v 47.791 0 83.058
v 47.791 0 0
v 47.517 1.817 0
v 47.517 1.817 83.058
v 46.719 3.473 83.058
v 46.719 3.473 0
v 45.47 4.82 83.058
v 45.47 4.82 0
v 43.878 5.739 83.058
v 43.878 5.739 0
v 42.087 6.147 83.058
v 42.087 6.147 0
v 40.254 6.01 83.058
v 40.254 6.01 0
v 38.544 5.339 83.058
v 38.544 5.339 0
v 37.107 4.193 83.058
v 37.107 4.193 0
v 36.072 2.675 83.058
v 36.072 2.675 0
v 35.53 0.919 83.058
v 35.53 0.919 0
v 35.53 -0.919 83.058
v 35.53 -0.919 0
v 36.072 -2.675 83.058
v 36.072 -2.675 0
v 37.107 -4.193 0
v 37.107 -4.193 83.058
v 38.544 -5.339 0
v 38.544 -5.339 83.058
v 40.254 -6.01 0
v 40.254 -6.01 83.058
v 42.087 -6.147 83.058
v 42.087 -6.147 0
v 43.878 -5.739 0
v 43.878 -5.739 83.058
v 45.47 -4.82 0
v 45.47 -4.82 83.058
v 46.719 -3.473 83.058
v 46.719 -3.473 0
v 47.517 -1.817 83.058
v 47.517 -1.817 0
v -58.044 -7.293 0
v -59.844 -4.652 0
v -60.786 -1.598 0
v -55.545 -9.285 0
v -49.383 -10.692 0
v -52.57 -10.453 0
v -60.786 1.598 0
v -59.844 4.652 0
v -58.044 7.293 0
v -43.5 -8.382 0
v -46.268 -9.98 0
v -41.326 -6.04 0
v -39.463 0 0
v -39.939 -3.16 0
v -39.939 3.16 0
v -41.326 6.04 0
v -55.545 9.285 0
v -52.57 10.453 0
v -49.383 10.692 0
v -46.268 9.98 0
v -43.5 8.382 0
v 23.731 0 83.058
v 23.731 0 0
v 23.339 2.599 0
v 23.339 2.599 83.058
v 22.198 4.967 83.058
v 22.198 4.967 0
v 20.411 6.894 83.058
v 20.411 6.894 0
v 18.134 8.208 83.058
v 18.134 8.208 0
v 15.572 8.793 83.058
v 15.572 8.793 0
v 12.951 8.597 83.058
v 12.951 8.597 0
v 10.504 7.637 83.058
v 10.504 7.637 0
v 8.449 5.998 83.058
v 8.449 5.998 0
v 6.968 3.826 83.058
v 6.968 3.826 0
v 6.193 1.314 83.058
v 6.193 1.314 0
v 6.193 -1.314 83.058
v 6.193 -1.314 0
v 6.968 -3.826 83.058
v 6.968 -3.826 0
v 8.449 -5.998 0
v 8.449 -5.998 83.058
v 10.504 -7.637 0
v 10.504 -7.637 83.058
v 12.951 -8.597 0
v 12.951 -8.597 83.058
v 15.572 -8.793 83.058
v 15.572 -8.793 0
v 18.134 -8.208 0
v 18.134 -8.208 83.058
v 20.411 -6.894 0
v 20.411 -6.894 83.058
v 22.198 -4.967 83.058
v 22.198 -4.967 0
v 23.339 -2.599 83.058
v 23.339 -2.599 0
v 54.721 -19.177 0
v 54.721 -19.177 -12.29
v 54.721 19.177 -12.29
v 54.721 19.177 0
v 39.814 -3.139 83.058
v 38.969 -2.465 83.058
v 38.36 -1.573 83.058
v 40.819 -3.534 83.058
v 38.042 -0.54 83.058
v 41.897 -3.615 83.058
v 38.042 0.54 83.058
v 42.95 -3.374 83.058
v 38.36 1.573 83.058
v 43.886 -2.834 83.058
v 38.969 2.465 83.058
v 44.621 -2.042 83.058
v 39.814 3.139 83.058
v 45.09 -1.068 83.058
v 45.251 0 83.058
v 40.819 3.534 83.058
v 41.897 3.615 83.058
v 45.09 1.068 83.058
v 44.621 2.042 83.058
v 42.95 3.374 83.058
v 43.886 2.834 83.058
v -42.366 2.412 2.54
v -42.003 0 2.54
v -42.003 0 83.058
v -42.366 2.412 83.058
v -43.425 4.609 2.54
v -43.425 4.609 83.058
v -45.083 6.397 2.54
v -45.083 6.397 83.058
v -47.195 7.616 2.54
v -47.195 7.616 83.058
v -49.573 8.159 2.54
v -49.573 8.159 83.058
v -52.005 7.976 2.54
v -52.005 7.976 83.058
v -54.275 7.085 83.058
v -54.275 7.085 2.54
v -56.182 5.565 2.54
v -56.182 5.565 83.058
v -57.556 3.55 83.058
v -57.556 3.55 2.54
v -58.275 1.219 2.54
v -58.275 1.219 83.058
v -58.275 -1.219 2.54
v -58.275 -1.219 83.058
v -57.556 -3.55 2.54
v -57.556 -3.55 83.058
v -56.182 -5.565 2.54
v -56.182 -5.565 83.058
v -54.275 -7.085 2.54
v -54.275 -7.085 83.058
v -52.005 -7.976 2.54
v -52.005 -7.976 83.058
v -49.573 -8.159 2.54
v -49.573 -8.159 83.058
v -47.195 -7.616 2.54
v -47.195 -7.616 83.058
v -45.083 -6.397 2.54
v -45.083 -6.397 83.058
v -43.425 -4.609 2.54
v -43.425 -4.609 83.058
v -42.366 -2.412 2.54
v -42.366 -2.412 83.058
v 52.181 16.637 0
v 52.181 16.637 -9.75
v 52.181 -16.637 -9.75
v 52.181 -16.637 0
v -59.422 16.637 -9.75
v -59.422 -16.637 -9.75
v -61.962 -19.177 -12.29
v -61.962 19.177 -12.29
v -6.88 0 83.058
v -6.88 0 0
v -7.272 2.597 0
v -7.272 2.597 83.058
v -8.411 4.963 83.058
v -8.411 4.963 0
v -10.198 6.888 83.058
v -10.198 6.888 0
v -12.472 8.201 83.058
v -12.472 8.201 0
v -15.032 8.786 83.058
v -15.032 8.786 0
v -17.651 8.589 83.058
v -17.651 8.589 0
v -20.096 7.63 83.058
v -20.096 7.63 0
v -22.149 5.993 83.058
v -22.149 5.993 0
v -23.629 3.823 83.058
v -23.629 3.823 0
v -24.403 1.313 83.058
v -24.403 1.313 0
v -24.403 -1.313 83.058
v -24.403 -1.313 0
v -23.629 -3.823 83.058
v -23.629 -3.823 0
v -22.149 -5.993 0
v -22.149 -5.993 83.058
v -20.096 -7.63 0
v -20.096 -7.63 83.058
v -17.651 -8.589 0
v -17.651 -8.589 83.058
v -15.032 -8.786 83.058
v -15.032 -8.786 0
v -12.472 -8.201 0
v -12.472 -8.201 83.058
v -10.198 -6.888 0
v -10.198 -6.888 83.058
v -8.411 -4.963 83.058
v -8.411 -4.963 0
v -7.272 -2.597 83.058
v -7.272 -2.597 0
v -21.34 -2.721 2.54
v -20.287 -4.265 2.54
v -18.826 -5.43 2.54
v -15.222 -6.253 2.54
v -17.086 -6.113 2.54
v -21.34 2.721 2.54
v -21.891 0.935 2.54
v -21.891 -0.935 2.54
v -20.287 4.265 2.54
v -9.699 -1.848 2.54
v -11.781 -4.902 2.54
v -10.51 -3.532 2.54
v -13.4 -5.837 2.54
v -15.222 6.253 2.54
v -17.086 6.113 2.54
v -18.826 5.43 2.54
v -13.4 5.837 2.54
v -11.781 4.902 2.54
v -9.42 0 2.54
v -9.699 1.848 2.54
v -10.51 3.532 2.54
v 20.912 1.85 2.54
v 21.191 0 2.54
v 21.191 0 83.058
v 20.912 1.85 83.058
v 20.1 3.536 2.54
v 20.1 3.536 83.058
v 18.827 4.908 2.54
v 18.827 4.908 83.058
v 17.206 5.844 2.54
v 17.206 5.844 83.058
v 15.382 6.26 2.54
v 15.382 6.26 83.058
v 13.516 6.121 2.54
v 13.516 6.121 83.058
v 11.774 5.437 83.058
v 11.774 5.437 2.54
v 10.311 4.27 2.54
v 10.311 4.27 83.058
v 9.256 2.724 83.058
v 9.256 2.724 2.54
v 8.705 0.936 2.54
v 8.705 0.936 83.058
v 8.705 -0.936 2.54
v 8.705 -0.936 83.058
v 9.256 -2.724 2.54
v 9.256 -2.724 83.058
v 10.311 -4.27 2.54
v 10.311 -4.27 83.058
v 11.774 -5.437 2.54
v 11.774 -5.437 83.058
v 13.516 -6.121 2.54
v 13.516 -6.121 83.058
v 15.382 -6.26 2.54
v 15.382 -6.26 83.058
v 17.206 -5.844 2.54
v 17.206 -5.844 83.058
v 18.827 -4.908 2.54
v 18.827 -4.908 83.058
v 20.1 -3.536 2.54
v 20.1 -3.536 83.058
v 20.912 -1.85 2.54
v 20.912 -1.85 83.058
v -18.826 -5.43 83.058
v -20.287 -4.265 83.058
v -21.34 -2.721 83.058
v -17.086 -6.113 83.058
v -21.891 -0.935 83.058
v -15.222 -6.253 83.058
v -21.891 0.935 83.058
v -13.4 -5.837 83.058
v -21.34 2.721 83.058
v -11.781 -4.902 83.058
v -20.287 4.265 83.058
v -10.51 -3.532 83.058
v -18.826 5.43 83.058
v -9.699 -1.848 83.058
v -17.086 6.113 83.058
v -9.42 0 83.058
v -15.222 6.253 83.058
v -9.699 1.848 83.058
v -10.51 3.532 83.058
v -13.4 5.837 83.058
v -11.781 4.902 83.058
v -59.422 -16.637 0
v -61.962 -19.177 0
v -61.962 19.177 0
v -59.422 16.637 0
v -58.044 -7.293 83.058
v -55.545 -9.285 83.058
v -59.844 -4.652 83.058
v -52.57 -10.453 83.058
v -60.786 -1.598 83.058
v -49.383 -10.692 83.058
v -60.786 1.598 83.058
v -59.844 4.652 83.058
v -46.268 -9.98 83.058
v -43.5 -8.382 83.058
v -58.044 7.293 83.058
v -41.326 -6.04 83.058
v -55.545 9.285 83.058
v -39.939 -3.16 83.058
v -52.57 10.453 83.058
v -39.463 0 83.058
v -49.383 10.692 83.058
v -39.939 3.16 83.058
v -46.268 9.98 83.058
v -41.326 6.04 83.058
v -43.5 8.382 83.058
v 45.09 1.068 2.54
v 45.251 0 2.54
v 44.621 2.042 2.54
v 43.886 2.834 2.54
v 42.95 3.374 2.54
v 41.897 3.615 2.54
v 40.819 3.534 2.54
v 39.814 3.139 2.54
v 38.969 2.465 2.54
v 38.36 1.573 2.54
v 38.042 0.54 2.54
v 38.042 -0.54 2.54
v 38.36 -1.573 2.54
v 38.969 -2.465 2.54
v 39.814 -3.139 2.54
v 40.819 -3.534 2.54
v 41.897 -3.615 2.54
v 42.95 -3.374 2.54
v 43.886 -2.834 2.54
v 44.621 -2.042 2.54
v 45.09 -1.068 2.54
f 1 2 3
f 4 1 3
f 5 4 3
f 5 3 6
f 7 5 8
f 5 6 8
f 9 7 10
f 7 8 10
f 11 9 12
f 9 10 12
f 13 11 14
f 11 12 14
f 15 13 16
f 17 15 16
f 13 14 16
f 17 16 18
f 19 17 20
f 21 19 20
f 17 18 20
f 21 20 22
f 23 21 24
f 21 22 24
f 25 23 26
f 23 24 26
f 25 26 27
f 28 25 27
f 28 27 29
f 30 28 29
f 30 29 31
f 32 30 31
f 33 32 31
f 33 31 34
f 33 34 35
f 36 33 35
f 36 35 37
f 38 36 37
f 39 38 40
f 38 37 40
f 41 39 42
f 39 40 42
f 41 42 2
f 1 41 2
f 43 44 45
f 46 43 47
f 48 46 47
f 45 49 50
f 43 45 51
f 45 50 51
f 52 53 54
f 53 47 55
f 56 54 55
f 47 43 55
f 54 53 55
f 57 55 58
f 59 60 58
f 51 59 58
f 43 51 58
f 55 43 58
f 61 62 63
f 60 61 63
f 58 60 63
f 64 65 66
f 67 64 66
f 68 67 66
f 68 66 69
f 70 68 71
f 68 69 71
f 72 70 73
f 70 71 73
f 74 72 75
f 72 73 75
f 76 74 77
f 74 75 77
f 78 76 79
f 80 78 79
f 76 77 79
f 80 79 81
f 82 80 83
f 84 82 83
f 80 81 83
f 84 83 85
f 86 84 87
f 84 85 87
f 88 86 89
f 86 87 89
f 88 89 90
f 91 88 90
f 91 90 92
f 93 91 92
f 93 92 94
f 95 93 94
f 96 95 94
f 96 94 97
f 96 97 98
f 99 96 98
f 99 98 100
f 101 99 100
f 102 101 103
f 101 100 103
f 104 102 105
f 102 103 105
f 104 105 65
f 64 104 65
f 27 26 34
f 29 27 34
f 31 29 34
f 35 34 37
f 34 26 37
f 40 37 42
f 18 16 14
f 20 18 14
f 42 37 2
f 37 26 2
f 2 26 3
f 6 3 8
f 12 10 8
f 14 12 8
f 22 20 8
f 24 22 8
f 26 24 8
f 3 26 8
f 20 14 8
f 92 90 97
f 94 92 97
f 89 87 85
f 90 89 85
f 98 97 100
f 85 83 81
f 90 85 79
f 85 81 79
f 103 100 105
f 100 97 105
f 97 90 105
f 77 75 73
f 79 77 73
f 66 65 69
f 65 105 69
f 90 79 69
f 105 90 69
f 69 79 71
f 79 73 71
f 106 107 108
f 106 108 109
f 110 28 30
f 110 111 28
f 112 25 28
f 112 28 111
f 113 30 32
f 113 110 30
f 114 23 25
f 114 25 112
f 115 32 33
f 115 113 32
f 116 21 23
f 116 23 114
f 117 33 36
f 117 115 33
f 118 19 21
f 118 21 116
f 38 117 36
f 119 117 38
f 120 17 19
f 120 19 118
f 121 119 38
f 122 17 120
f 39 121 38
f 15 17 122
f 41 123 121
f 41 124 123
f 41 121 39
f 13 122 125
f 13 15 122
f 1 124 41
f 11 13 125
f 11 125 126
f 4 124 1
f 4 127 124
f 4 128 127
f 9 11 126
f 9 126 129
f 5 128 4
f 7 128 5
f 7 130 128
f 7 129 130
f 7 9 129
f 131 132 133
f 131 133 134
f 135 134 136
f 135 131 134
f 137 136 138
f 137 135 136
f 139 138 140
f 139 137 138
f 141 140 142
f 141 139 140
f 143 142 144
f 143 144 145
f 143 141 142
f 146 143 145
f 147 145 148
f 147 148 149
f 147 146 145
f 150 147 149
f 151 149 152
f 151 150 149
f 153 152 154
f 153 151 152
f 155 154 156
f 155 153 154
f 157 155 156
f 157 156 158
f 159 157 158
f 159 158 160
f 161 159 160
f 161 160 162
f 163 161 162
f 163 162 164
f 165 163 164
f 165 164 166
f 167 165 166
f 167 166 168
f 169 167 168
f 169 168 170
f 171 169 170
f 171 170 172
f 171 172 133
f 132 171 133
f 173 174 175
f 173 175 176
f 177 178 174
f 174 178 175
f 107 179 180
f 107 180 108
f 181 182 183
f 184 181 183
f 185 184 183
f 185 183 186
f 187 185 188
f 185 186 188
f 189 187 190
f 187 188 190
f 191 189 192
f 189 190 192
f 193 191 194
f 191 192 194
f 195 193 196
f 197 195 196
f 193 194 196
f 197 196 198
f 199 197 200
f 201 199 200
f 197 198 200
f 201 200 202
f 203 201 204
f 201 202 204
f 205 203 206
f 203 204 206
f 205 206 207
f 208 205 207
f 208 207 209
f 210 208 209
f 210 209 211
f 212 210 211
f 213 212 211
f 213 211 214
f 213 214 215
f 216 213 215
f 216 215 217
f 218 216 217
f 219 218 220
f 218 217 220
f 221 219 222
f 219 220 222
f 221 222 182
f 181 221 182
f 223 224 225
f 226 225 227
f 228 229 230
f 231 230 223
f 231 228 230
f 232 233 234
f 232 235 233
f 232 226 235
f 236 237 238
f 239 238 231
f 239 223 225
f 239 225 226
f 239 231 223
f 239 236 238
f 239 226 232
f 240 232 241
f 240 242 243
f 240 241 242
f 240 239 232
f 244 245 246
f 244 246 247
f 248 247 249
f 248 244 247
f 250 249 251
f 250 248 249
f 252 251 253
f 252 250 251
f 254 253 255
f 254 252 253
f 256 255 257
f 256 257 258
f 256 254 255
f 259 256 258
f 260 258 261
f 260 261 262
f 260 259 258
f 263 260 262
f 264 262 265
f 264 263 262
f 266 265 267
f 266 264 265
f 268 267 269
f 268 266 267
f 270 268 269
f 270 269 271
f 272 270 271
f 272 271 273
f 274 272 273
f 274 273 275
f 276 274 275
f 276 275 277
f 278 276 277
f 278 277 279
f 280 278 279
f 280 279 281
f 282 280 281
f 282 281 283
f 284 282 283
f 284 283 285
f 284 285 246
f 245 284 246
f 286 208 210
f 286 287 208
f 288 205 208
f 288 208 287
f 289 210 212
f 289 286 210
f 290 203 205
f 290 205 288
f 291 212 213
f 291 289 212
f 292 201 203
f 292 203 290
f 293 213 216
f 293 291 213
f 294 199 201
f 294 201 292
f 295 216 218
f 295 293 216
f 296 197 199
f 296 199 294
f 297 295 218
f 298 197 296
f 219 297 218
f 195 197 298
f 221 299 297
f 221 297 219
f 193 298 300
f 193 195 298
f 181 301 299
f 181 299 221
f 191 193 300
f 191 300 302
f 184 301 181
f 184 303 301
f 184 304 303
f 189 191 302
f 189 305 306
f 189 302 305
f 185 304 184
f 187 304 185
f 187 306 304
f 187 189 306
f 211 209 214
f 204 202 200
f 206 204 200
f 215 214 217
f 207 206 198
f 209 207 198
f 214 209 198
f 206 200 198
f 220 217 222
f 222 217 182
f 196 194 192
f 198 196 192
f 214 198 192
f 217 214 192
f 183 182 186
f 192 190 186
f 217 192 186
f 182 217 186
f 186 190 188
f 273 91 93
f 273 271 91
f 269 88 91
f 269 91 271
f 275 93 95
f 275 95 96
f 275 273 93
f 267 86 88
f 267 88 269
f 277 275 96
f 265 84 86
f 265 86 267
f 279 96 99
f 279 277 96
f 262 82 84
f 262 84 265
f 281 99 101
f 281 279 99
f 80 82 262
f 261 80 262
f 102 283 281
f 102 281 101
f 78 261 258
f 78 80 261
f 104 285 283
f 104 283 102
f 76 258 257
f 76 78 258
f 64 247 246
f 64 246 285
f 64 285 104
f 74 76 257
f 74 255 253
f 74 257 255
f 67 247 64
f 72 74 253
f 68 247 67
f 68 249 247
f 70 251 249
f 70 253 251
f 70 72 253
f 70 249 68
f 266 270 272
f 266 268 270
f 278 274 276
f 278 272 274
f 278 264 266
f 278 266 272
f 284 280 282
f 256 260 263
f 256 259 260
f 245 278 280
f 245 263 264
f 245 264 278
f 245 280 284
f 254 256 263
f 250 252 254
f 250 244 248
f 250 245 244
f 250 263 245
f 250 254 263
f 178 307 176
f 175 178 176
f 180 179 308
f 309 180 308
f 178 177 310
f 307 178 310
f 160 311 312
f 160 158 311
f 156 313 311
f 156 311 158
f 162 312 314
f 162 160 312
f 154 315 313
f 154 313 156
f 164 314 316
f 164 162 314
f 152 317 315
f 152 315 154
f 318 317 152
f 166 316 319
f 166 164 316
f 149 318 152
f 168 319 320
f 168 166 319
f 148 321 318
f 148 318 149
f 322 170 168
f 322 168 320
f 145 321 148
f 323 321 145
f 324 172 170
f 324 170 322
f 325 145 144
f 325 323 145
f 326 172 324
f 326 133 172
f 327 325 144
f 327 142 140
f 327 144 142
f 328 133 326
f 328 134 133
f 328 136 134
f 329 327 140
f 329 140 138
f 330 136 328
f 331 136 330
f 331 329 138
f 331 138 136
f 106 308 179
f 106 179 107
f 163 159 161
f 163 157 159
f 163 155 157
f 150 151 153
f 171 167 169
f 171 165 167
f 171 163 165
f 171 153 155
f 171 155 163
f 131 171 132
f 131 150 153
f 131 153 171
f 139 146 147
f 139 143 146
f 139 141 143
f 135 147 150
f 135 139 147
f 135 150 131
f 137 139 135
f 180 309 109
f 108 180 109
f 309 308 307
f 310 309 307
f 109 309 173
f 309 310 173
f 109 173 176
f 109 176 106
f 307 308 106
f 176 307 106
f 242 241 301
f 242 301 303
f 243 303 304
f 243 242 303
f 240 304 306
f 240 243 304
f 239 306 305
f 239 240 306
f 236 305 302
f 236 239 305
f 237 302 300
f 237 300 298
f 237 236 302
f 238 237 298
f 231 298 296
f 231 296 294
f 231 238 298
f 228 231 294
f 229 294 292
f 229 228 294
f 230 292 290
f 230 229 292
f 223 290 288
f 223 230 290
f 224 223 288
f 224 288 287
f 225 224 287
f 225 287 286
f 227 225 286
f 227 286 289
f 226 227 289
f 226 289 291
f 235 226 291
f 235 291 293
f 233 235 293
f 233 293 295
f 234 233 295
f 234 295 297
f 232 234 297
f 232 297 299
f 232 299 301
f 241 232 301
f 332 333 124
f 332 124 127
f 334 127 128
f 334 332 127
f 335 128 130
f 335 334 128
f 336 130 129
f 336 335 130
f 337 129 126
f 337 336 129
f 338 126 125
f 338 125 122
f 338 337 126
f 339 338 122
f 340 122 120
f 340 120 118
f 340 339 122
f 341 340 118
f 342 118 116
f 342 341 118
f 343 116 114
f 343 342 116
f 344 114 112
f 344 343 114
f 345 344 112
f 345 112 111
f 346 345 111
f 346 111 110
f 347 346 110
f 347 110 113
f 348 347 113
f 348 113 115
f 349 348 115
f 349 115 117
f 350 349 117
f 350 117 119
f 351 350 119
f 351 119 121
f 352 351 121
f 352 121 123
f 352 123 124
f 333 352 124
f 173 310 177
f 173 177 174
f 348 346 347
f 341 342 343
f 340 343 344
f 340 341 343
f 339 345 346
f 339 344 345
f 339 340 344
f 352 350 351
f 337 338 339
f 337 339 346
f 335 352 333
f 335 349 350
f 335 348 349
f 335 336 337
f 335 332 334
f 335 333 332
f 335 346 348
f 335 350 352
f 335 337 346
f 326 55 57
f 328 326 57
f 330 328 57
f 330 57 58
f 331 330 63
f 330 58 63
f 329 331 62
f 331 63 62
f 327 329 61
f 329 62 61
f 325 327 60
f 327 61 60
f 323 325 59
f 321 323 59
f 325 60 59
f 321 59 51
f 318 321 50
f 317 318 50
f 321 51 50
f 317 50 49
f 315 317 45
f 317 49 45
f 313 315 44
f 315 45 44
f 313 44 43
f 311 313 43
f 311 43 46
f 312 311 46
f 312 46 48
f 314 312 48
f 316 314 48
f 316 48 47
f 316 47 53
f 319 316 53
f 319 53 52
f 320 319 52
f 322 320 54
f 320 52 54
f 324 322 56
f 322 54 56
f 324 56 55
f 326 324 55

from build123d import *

# Parameters (mm, degrees)
F0_R     = 10.721612753
F1_DEPTH = 83.058
F0_R_2   = 8.8103259694
F0_R_3   = 8.8179558516
F0_R_4   = 6.164722253
F2_W     = 116.6835911572
F2_H     = 12.2901778668
F3_DEPTH = 19.177
F4_T     = -2.54
F4_2_T   = -2.54
F4_3_T   = -2.54
F4_4_T   = -2.54
F5_T     = -2.54


# Not quite as in the source:
# - a feature names something its author has since deleted; it is built from what else it names


with BuildPart() as f1:
    # F0 (on Top) → F1 (new body)
    with BuildSketch(Plane.XY):
        with Locations((-50.1845553517, 0)):
            Circle(F0_R)
    extrude(amount=F1_DEPTH)

    # F4
    f4_openings = [f1.faces().sort_by_distance(p)[0] for p in [
        (-50.184555, 0, 83.058),
    ]]
    offset(amount=F4_T, openings=f4_openings)


with BuildPart() as f1b:
    # F0 (on Top) → F1, piece 2 (new body)
    with BuildSketch(Plane.XY):
        with Locations((-15.6907774508, 0)):
            Circle(F0_R_2)
    extrude(amount=F1_DEPTH)

    # F4#4
    f4_4_openings = [f1b.faces().sort_by_distance(p)[0] for p in [
        (-15.690777, 0, 83.058),
    ]]
    offset(amount=F4_4_T, openings=f4_4_openings)


with BuildPart() as f1c:
    # F0 (on Top) → F1, piece 3 (new body)
    with BuildSketch(Plane.XY):
        with Locations((14.9127244949, 0)):
            Circle(F0_R_3)
    extrude(amount=F1_DEPTH)

    # F4#2
    f4_2_openings = [f1c.faces().sort_by_distance(p)[0] for p in [
        (14.912724, 0, 83.058),
    ]]
    offset(amount=F4_2_T, openings=f4_2_openings)


with BuildPart() as f1d:
    # F0 (on Top) → F1, piece 4 (new body)
    with BuildSketch(Plane.XY):
        with Locations((41.6259467602, 0)):
            Circle(F0_R_4)
    extrude(amount=F1_DEPTH)

    # F4#3
    f4_3_openings = [f1d.faces().sort_by_distance(p)[0] for p in [
        (41.625947, 0, 83.058),
    ]]
    offset(amount=F4_3_T, openings=f4_3_openings)


with BuildPart() as f3:
    # F2 (on Front) → F3 (new body, symmetric)
    with BuildSketch(Plane.XZ):
        with Locations((-3.6206040531, -6.1450889334)):
            Rectangle(F2_W, F2_H)
    extrude(amount=F3_DEPTH, both=True)

    # F5
    f5_openings = [f3.faces().sort_by_distance(p)[0] for p in [
        (-3.620604, 0, 0),
    ]]
    offset(amount=F5_T, openings=f5_openings)


solid = Compound([f1.part, f1b.part, f1c.part, f1d.part, f3.part])
